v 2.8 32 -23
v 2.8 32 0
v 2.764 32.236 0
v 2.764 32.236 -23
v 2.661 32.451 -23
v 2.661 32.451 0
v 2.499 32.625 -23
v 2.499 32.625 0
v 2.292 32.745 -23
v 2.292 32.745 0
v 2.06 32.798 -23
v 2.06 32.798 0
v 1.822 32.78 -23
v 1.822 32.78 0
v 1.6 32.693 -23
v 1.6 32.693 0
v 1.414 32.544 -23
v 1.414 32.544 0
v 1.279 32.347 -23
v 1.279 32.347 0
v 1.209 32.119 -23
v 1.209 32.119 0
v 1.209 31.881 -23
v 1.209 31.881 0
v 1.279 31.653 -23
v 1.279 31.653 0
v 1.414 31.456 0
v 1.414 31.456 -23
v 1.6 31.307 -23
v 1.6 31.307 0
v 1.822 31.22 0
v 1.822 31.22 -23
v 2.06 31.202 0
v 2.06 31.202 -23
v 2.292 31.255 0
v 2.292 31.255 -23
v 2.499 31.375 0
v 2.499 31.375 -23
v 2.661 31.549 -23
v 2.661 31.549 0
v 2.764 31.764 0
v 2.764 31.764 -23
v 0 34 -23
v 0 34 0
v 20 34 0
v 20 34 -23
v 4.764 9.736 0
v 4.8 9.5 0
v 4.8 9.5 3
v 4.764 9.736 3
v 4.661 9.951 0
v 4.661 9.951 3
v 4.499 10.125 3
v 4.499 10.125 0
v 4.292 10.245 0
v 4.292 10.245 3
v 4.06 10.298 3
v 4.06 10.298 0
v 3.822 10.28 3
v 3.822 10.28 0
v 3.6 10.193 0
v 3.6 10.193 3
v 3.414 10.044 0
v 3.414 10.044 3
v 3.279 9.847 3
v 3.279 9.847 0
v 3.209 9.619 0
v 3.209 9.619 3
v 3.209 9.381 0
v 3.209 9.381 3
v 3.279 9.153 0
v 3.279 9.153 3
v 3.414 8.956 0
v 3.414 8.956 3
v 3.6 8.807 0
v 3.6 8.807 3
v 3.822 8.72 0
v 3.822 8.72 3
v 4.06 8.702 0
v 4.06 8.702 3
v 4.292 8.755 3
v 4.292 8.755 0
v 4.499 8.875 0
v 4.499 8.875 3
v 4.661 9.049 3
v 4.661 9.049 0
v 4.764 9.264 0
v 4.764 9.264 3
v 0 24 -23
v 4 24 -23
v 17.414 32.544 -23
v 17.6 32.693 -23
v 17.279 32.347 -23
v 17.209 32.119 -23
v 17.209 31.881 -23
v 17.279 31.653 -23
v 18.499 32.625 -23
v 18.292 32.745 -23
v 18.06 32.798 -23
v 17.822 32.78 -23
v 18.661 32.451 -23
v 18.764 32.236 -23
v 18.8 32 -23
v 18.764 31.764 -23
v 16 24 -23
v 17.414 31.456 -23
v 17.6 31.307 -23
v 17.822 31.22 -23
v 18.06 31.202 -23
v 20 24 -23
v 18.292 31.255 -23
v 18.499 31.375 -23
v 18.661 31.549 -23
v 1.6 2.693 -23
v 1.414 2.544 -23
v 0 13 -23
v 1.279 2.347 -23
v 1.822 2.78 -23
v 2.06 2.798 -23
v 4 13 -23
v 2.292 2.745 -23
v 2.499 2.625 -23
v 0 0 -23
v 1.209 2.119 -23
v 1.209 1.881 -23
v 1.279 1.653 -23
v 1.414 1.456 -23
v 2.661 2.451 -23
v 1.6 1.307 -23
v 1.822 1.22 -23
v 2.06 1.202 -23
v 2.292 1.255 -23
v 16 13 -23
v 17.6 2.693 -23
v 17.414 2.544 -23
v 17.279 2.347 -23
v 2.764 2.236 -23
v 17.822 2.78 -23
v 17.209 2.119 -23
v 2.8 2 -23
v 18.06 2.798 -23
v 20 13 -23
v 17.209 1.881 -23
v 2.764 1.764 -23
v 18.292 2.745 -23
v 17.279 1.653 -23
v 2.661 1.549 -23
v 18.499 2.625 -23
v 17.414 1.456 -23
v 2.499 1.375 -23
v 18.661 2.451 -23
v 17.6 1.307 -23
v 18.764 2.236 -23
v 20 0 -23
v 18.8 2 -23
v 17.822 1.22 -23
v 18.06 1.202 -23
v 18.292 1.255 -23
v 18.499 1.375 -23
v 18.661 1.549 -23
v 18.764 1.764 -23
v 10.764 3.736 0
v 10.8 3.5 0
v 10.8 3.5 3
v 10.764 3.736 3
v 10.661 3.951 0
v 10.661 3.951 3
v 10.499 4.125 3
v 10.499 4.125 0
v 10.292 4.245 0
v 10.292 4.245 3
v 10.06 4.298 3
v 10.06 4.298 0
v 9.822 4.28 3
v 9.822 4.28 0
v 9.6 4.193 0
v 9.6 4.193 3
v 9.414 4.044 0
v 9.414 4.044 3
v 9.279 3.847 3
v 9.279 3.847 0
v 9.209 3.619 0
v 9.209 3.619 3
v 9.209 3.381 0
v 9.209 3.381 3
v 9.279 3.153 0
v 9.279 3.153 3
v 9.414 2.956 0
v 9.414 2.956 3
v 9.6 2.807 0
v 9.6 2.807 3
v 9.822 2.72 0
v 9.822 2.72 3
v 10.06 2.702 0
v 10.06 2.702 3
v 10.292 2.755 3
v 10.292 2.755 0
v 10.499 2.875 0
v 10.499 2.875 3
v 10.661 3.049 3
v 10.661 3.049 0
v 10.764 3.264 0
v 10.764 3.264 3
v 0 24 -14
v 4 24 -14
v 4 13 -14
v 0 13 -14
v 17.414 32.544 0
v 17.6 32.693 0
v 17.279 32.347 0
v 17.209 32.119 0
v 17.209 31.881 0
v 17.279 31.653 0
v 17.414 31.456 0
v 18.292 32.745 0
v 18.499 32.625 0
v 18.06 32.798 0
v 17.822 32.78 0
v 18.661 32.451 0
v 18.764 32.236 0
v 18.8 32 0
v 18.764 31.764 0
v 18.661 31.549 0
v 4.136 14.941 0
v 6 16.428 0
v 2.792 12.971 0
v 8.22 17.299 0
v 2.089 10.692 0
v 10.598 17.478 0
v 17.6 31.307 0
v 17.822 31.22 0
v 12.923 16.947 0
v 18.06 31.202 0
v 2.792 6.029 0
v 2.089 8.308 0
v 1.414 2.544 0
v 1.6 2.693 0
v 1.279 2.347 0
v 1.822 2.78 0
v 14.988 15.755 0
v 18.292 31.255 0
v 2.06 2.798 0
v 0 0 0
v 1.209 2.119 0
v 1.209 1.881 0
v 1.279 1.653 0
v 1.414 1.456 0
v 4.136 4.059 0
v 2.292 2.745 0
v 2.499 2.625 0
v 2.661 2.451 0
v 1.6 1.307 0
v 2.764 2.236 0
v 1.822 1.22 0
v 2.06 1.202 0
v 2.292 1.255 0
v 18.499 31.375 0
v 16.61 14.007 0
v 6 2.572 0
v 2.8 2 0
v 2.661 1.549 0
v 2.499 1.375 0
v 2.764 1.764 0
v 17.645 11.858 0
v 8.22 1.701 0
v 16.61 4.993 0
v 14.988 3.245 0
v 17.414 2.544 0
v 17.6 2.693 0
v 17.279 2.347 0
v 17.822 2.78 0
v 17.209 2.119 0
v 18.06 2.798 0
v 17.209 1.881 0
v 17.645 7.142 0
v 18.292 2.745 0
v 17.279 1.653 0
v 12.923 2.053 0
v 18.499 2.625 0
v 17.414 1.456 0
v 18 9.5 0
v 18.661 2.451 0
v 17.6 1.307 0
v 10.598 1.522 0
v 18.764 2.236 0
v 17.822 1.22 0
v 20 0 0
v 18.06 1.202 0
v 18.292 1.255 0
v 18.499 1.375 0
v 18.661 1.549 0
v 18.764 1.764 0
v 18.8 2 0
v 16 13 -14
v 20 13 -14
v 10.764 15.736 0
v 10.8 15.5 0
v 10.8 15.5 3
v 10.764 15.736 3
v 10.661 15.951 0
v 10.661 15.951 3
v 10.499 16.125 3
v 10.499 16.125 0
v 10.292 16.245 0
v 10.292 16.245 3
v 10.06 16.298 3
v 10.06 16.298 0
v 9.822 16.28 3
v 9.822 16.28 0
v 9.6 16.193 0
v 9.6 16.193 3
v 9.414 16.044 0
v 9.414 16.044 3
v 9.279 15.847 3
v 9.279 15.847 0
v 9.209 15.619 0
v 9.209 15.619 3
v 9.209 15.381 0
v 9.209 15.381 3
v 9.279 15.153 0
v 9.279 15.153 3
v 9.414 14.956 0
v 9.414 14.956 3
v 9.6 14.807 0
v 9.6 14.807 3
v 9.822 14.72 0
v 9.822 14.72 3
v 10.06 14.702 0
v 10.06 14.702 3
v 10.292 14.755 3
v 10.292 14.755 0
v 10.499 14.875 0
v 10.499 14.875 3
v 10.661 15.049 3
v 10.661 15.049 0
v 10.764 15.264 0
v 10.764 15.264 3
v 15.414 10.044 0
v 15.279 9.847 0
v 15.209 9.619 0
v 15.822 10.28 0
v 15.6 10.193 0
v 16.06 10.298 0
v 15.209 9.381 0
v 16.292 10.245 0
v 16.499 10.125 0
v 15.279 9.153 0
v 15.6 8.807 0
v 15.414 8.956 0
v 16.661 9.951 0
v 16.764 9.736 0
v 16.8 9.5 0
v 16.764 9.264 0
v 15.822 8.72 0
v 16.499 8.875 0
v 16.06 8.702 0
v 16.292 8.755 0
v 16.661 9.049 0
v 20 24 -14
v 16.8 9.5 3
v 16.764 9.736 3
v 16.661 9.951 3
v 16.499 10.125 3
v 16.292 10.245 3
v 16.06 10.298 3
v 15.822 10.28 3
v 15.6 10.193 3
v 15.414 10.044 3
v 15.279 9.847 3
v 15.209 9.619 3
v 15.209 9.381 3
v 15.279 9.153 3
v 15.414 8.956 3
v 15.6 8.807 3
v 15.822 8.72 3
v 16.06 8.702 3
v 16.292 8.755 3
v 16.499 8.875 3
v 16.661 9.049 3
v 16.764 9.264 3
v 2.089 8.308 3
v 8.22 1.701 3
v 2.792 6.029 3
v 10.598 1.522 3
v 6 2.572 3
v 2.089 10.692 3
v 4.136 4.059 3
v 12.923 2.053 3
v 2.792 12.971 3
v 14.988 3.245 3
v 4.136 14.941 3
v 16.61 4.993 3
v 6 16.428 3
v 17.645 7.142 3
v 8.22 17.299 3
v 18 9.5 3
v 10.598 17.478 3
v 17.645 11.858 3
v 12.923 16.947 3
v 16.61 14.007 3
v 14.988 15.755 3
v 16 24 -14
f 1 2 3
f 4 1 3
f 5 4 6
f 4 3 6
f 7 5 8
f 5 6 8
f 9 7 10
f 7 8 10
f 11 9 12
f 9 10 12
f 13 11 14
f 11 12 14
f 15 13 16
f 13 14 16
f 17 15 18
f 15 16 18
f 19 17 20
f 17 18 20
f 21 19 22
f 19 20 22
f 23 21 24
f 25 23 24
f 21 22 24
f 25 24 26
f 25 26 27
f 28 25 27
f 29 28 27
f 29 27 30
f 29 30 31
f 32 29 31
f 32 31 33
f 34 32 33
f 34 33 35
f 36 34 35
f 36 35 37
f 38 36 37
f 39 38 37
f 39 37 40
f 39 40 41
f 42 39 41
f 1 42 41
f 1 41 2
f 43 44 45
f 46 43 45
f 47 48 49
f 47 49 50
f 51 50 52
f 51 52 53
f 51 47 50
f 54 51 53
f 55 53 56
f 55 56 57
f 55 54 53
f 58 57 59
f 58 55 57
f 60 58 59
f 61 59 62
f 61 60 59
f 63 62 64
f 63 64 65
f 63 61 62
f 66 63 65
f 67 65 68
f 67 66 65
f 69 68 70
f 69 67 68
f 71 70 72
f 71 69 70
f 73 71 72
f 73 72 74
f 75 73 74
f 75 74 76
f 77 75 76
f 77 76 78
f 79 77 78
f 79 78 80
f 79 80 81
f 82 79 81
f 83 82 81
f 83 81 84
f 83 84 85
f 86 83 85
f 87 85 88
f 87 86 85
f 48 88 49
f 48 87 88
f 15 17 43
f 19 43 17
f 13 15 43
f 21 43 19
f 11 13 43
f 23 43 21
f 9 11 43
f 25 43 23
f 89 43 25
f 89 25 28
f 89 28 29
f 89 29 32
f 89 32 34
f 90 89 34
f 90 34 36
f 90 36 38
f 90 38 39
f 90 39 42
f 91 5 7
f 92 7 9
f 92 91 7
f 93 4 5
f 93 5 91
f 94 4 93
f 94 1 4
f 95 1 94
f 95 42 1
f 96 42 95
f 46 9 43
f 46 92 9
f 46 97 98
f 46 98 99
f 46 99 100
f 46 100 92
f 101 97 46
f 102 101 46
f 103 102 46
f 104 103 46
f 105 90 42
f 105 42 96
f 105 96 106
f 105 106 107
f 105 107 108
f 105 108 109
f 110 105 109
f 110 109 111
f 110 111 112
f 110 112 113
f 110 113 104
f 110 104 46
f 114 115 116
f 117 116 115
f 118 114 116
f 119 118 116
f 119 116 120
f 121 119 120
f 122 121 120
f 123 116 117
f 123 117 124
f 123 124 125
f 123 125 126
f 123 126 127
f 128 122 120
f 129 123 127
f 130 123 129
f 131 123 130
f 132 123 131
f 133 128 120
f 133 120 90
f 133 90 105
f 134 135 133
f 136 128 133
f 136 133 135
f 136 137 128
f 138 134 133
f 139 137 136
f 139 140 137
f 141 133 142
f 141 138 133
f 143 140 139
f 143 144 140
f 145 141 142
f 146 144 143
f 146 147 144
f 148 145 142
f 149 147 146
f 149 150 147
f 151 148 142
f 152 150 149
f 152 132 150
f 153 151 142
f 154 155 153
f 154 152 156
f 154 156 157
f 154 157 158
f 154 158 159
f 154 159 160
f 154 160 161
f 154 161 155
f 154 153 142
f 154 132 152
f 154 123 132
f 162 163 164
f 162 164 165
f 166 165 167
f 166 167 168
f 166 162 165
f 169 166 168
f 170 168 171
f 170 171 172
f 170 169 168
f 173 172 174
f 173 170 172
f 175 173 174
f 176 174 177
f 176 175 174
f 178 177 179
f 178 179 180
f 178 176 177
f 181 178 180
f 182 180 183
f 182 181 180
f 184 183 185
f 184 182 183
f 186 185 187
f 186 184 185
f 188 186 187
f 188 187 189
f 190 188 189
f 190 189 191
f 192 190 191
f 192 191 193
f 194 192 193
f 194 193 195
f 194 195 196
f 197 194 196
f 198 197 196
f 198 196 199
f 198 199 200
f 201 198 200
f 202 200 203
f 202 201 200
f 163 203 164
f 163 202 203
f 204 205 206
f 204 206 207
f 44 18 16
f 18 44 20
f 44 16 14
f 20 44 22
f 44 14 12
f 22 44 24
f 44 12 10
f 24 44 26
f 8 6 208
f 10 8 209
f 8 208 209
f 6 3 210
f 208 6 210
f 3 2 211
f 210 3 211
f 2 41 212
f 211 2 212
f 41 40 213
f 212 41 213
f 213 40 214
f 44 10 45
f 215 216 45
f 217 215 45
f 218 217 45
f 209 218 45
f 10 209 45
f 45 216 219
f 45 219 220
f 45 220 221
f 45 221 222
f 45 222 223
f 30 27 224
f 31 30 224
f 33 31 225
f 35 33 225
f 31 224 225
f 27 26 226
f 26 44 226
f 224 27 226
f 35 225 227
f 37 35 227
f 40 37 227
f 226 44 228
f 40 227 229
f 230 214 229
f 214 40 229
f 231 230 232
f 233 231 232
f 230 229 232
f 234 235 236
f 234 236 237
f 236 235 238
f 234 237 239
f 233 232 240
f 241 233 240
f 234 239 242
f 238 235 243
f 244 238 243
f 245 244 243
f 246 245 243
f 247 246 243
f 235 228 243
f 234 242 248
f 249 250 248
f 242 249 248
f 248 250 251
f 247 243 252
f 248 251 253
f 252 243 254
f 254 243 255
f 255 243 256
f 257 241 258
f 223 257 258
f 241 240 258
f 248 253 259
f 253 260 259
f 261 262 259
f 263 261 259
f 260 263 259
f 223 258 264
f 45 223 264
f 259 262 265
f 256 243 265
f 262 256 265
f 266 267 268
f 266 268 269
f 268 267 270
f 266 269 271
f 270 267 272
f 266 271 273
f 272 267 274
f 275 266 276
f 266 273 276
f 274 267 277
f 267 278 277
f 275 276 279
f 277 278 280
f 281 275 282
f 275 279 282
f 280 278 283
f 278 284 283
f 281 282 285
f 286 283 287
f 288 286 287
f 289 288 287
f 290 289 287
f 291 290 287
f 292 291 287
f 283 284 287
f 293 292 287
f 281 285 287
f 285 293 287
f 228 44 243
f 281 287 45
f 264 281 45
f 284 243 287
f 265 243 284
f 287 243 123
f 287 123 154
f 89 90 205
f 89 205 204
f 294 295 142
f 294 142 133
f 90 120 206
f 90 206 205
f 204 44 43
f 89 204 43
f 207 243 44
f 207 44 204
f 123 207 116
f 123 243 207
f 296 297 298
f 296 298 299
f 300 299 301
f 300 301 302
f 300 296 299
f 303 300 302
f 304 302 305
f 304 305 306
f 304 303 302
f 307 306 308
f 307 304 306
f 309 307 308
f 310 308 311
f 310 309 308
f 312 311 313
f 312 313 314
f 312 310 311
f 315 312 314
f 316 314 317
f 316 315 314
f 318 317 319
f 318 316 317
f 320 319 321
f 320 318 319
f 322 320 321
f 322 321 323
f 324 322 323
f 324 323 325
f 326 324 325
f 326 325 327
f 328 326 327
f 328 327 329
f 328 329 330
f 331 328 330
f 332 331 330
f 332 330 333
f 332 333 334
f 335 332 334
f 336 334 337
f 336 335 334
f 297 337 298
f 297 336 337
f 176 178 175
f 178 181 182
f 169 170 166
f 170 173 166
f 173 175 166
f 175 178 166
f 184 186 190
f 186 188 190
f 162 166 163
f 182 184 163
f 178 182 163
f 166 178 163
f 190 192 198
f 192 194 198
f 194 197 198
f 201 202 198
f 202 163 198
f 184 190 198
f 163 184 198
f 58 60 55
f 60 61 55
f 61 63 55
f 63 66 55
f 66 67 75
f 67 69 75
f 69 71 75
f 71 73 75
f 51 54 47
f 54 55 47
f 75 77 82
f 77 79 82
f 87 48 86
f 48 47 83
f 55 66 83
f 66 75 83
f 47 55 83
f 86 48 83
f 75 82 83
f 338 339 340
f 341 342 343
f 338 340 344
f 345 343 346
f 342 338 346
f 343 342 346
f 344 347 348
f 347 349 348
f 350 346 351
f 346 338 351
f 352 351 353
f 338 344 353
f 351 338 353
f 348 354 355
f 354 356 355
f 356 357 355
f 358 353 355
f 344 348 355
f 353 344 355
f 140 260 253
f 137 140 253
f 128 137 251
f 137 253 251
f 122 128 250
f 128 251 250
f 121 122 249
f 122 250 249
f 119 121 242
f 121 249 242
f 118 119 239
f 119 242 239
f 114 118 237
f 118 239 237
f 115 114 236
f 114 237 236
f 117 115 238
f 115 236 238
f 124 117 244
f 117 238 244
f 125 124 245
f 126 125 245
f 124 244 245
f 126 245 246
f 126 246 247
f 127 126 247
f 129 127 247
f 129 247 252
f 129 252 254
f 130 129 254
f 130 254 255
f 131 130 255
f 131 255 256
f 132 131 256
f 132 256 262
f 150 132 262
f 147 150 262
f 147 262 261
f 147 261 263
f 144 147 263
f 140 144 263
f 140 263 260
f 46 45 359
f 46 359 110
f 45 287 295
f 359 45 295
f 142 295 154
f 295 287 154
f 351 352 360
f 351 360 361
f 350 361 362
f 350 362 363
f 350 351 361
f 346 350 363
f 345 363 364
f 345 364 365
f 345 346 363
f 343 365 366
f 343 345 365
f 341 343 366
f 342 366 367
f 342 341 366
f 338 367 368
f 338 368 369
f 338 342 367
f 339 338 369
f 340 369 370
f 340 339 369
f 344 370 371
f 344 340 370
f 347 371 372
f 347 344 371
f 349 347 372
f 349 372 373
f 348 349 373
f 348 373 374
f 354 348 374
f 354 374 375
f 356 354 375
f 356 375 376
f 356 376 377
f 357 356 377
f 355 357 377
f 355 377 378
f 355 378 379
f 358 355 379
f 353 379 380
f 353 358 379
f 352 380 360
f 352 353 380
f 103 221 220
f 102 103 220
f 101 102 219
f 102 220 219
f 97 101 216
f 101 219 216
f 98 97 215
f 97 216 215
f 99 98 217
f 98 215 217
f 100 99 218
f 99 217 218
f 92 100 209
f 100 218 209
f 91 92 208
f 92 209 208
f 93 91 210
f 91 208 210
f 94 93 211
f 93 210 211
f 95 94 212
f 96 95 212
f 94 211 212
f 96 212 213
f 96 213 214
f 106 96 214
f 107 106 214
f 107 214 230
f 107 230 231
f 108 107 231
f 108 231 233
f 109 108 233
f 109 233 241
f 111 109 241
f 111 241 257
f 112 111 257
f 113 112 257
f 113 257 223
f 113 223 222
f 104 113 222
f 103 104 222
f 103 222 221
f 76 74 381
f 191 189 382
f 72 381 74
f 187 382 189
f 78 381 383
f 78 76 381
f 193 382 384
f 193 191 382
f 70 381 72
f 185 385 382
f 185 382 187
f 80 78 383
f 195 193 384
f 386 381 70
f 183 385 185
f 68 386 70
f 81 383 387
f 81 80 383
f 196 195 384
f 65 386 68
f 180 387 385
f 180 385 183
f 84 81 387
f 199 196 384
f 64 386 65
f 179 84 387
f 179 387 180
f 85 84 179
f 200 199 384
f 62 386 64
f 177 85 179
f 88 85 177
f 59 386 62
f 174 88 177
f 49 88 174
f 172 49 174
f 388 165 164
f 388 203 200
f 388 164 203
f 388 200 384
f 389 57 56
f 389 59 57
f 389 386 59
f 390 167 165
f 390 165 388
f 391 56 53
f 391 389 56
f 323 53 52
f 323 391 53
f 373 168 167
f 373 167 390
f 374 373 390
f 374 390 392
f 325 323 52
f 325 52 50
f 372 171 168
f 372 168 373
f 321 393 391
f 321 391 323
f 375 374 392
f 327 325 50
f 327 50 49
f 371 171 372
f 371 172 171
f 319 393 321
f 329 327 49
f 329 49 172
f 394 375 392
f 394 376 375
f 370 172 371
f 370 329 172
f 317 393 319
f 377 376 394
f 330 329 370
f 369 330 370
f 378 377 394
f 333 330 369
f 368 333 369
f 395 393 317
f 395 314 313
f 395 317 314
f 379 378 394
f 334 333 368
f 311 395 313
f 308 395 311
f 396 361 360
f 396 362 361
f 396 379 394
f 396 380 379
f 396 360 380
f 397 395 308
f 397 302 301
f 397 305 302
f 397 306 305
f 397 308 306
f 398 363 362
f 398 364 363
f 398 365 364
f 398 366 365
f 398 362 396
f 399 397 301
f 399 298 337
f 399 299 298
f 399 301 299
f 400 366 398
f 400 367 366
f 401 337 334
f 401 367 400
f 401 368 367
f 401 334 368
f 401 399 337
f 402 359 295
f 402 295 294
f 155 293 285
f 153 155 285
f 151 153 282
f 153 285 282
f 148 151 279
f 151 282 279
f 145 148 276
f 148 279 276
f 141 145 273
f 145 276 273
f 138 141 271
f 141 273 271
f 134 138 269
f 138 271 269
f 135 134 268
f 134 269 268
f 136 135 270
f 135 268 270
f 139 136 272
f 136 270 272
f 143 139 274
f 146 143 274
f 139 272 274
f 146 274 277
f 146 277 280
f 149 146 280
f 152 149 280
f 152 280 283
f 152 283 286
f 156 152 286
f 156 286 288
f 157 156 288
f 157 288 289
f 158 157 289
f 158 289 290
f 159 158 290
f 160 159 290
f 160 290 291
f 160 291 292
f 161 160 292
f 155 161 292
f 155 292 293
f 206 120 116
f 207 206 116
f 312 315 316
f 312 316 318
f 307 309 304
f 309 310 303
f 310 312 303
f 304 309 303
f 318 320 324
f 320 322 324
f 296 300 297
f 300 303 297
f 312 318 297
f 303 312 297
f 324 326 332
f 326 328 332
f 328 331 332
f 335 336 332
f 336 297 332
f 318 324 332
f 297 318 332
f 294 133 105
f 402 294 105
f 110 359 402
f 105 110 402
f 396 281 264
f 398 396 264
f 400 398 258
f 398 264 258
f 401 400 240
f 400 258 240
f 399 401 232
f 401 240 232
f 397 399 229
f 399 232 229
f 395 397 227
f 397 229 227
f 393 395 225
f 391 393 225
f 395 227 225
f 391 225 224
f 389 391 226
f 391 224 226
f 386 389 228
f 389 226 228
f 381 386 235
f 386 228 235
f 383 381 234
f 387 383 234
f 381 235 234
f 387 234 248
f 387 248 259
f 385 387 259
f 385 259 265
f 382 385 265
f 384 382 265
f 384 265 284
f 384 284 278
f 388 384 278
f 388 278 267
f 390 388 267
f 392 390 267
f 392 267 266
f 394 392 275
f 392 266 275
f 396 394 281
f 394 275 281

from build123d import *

# Parameters (mm, degrees)
SKETCH1_W           = 20
SKETCH1_H           = 23
BOSS_EXTRUDE1_DEPTH = 34
SKETCH2_R           = 0.8
CUT_EXTRUDE1_DEPTH  = 24
SKETCH3_R           = 8
SKETCH3_R_2         = 0.8
BOSS_EXTRUDE2_DEPTH = 3
SKETCH4_W           = 4
SKETCH4_H           = 11
CUT_EXTRUDE2_DEPTH  = 9


with BuildPart() as part:
    # Sketch1 → Boss-Extrude1 (new body)
    with BuildSketch(Plane(origin=(0, 0, 0), x_dir=(1, 0, 0), z_dir=(0, 1, 0))):
        with Locations((10, 11.5)):
            Rectangle(SKETCH1_W, SKETCH1_H)
    extrude(amount=BOSS_EXTRUDE1_DEPTH)

    # Sketch2 → Cut-Extrude1 (cut, through all)
    with BuildSketch(Plane.XY):
        with Locations((2, 32)):
            Circle(SKETCH2_R)
        with Locations((18, 32)):
            Circle(SKETCH2_R)
        with Locations((18, 2)):
            Circle(SKETCH2_R)
        with Locations((2, 2)):
            Circle(SKETCH2_R)
    extrude(amount=-CUT_EXTRUDE1_DEPTH, mode=Mode.SUBTRACT)

    # Sketch3 → Boss-Extrude2 (add)
    with BuildSketch(Plane.XY):
        with Locations((10, 9.5)):
            Circle(SKETCH3_R)
        with Locations((10, 15.5)):
            Circle(SKETCH3_R_2, mode=Mode.SUBTRACT)
        with Locations((4, 9.5)):
            Circle(SKETCH3_R_2, mode=Mode.SUBTRACT)
        with Locations((10, 3.5)):
            Circle(SKETCH3_R_2, mode=Mode.SUBTRACT)
        with Locations((16, 9.5)):
            Circle(SKETCH3_R_2, mode=Mode.SUBTRACT)
    extrude(amount=BOSS_EXTRUDE2_DEPTH)

    # Sketch4 → Cut-Extrude2 (cut)
    with BuildSketch(Plane(origin=(0, 0, -23), x_dir=(-1, 0, 0), z_dir=(0, 0, -1))):
        with Locations((-18, 18.5)):
            Rectangle(SKETCH4_W, SKETCH4_H)
        with Locations((-2, 18.5)):
            Rectangle(SKETCH4_W, SKETCH4_H)
    extrude(amount=-CUT_EXTRUDE2_DEPTH, mode=Mode.SUBTRACT)


solid = part.part
